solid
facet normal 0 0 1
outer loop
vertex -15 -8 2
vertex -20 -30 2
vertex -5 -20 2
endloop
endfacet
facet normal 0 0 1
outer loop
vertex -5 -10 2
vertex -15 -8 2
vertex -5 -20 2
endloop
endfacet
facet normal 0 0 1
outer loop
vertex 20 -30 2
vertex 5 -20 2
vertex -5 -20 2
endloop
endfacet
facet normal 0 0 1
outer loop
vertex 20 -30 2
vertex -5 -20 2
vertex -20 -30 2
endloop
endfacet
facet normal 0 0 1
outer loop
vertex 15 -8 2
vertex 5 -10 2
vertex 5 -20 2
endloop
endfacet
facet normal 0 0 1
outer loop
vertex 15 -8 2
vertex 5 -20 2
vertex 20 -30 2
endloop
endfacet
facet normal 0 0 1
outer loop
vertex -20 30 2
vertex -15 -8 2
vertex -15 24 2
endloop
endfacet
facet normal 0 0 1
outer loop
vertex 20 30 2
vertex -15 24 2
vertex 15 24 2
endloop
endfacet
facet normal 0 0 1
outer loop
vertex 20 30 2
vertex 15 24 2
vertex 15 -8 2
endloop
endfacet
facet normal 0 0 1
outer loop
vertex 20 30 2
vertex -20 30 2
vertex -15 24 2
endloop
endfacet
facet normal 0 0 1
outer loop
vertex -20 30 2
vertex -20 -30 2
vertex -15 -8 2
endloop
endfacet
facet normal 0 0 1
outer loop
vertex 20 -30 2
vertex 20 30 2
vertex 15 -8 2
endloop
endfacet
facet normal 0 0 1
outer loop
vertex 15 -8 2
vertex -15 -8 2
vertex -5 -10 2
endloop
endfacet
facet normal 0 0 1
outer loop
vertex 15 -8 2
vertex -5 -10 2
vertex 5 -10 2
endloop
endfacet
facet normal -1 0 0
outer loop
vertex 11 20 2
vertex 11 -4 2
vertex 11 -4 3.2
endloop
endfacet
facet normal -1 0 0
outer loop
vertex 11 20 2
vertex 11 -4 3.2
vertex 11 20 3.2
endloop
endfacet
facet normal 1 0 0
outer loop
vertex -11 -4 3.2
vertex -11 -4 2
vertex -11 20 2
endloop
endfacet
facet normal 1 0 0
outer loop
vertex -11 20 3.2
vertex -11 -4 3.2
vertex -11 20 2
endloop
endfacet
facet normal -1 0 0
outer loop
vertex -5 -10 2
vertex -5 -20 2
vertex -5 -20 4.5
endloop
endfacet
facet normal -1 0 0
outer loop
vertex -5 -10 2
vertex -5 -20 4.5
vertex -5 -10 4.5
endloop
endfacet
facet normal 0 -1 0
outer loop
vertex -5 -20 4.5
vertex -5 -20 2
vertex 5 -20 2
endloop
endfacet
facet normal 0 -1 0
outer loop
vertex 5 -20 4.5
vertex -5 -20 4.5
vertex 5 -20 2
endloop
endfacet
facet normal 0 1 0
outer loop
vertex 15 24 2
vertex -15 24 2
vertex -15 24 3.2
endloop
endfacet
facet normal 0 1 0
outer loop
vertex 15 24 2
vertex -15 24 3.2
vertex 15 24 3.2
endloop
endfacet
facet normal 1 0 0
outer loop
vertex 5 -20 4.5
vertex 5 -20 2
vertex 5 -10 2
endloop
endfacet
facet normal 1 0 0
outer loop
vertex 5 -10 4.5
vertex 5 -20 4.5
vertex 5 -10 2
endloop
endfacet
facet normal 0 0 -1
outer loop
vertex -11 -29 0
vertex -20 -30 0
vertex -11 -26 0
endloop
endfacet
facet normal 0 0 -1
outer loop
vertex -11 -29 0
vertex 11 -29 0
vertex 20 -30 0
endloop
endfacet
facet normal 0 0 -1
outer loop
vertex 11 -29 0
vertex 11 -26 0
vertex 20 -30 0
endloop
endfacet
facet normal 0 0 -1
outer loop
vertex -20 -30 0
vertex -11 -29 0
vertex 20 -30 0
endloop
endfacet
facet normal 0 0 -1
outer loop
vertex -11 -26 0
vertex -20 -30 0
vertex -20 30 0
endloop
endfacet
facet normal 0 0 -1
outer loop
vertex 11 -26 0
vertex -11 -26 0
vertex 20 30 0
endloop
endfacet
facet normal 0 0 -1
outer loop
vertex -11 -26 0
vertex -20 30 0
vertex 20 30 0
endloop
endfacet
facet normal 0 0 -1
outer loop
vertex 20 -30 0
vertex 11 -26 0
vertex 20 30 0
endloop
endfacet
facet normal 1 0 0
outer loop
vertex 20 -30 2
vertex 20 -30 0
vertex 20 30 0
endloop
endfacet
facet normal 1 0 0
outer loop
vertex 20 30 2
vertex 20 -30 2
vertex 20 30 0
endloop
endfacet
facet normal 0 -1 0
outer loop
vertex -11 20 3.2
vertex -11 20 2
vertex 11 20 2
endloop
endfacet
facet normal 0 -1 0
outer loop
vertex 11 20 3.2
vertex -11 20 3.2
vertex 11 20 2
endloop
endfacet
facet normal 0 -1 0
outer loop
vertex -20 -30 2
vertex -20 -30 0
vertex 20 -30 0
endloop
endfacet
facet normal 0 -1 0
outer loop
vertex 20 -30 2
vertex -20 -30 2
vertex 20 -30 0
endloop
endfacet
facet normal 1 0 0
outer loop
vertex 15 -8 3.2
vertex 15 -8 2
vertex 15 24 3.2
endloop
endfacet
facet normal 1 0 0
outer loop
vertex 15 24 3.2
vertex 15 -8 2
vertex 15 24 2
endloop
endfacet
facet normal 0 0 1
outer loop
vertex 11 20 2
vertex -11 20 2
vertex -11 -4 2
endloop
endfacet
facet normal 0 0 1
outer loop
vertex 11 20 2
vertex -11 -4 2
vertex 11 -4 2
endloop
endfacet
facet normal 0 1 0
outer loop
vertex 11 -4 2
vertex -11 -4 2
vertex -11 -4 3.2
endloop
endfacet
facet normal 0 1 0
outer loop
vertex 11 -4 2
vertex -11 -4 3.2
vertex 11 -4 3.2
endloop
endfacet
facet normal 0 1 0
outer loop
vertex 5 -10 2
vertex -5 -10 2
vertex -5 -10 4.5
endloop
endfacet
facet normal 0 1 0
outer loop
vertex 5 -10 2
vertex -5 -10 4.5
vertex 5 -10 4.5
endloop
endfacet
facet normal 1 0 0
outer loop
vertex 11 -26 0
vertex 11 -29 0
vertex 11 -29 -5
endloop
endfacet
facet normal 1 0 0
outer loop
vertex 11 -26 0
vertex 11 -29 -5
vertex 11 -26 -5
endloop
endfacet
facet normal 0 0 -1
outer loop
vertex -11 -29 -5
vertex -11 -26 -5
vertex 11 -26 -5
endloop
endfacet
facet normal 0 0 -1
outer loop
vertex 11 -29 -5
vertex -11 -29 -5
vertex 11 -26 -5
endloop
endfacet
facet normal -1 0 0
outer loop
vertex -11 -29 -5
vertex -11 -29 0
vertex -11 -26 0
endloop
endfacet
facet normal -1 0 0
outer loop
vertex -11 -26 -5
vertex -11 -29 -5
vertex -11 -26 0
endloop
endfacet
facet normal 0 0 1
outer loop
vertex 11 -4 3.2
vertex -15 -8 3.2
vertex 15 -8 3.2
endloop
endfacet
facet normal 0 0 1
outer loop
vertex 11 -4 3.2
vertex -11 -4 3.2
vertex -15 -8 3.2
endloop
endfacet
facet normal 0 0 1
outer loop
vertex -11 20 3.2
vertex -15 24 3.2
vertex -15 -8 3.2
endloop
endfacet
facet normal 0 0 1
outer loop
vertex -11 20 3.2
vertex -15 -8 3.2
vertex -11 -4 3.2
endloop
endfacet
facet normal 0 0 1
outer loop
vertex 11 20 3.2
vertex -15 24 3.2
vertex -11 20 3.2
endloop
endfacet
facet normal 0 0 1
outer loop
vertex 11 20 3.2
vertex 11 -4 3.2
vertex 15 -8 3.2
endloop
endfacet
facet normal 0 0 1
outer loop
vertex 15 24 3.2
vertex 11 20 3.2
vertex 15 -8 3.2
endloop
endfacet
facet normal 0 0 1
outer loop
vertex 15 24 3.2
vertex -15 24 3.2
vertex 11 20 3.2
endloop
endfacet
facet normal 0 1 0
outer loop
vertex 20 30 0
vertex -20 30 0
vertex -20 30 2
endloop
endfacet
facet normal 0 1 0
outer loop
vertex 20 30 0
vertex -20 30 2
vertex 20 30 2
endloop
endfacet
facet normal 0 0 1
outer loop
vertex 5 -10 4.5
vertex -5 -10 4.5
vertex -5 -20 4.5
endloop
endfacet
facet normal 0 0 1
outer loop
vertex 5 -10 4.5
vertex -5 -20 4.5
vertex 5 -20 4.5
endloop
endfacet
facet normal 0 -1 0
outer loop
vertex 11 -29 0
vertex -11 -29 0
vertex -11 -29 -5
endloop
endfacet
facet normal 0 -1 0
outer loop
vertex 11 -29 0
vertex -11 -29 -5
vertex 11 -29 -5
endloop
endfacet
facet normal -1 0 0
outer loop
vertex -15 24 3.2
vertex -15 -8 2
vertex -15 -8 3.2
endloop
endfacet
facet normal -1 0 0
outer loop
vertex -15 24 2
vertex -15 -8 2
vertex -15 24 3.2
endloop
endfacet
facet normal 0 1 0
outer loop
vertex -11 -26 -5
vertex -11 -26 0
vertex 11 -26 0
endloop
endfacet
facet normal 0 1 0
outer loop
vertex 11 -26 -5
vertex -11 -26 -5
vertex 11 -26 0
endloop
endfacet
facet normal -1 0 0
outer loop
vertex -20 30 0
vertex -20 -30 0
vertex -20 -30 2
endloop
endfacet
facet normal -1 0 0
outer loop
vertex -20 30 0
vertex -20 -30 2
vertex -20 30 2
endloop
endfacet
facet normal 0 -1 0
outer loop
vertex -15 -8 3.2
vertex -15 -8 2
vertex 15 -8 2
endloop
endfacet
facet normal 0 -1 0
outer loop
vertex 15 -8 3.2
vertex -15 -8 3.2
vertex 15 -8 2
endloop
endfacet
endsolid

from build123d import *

# Parameters (mm, degrees)
ESQUISSE1_W          = 40
ESQUISSE1_H          = 60
PCB_RFID_RC522_DEPTH = 2
ANTENNE_RFID_START   = 2
ESQUISSE2_W          = 30
ESQUISSE2_H          = 32
ESQUISSE2_W_2        = 22
ESQUISSE2_H_2        = 24
ANTENNE_RFID_DEPTH   = 1.2
PUCE_MFRC522_START   = 2
ESQUISSE3_W          = 10
ESQUISSE3_H          = 10
PUCE_MFRC522_DEPTH   = 2.5
ESQUISSE4_W          = 22
ESQUISSE4_H          = 3
CONNECTEUR_SPI_DEPTH = 5


with BuildPart() as part:
    # Esquisse1 → PCB_RFID_RC522 (new body)
    with BuildSketch(Plane.XY):
        Rectangle(ESQUISSE1_W, ESQUISSE1_H)
    extrude(amount=PCB_RFID_RC522_DEPTH)

    # Esquisse2 → Antenne_RFID (add)
    with BuildSketch(Plane.XY.offset(ANTENNE_RFID_START)):
        with Locations((0, 8)):
            Rectangle(ESQUISSE2_W, ESQUISSE2_H)
        with Locations((0, 8)):
            Rectangle(ESQUISSE2_W_2, ESQUISSE2_H_2, mode=Mode.SUBTRACT)
    extrude(amount=ANTENNE_RFID_DEPTH)

    # Esquisse3 → Puce_MFRC522 (add)
    with BuildSketch(Plane.XY.offset(PUCE_MFRC522_START)):
        with Locations((0, -15)):
            Rectangle(ESQUISSE3_W, ESQUISSE3_H)
    extrude(amount=PUCE_MFRC522_DEPTH)

    # Esquisse4 → Connecteur_SPI (add)
    with BuildSketch(Plane.XY):
        with Locations((0, -27.5)):
            Rectangle(ESQUISSE4_W, ESQUISSE4_H)
    extrude(amount=-CONNECTEUR_SPI_DEPTH)


solid = part.part
